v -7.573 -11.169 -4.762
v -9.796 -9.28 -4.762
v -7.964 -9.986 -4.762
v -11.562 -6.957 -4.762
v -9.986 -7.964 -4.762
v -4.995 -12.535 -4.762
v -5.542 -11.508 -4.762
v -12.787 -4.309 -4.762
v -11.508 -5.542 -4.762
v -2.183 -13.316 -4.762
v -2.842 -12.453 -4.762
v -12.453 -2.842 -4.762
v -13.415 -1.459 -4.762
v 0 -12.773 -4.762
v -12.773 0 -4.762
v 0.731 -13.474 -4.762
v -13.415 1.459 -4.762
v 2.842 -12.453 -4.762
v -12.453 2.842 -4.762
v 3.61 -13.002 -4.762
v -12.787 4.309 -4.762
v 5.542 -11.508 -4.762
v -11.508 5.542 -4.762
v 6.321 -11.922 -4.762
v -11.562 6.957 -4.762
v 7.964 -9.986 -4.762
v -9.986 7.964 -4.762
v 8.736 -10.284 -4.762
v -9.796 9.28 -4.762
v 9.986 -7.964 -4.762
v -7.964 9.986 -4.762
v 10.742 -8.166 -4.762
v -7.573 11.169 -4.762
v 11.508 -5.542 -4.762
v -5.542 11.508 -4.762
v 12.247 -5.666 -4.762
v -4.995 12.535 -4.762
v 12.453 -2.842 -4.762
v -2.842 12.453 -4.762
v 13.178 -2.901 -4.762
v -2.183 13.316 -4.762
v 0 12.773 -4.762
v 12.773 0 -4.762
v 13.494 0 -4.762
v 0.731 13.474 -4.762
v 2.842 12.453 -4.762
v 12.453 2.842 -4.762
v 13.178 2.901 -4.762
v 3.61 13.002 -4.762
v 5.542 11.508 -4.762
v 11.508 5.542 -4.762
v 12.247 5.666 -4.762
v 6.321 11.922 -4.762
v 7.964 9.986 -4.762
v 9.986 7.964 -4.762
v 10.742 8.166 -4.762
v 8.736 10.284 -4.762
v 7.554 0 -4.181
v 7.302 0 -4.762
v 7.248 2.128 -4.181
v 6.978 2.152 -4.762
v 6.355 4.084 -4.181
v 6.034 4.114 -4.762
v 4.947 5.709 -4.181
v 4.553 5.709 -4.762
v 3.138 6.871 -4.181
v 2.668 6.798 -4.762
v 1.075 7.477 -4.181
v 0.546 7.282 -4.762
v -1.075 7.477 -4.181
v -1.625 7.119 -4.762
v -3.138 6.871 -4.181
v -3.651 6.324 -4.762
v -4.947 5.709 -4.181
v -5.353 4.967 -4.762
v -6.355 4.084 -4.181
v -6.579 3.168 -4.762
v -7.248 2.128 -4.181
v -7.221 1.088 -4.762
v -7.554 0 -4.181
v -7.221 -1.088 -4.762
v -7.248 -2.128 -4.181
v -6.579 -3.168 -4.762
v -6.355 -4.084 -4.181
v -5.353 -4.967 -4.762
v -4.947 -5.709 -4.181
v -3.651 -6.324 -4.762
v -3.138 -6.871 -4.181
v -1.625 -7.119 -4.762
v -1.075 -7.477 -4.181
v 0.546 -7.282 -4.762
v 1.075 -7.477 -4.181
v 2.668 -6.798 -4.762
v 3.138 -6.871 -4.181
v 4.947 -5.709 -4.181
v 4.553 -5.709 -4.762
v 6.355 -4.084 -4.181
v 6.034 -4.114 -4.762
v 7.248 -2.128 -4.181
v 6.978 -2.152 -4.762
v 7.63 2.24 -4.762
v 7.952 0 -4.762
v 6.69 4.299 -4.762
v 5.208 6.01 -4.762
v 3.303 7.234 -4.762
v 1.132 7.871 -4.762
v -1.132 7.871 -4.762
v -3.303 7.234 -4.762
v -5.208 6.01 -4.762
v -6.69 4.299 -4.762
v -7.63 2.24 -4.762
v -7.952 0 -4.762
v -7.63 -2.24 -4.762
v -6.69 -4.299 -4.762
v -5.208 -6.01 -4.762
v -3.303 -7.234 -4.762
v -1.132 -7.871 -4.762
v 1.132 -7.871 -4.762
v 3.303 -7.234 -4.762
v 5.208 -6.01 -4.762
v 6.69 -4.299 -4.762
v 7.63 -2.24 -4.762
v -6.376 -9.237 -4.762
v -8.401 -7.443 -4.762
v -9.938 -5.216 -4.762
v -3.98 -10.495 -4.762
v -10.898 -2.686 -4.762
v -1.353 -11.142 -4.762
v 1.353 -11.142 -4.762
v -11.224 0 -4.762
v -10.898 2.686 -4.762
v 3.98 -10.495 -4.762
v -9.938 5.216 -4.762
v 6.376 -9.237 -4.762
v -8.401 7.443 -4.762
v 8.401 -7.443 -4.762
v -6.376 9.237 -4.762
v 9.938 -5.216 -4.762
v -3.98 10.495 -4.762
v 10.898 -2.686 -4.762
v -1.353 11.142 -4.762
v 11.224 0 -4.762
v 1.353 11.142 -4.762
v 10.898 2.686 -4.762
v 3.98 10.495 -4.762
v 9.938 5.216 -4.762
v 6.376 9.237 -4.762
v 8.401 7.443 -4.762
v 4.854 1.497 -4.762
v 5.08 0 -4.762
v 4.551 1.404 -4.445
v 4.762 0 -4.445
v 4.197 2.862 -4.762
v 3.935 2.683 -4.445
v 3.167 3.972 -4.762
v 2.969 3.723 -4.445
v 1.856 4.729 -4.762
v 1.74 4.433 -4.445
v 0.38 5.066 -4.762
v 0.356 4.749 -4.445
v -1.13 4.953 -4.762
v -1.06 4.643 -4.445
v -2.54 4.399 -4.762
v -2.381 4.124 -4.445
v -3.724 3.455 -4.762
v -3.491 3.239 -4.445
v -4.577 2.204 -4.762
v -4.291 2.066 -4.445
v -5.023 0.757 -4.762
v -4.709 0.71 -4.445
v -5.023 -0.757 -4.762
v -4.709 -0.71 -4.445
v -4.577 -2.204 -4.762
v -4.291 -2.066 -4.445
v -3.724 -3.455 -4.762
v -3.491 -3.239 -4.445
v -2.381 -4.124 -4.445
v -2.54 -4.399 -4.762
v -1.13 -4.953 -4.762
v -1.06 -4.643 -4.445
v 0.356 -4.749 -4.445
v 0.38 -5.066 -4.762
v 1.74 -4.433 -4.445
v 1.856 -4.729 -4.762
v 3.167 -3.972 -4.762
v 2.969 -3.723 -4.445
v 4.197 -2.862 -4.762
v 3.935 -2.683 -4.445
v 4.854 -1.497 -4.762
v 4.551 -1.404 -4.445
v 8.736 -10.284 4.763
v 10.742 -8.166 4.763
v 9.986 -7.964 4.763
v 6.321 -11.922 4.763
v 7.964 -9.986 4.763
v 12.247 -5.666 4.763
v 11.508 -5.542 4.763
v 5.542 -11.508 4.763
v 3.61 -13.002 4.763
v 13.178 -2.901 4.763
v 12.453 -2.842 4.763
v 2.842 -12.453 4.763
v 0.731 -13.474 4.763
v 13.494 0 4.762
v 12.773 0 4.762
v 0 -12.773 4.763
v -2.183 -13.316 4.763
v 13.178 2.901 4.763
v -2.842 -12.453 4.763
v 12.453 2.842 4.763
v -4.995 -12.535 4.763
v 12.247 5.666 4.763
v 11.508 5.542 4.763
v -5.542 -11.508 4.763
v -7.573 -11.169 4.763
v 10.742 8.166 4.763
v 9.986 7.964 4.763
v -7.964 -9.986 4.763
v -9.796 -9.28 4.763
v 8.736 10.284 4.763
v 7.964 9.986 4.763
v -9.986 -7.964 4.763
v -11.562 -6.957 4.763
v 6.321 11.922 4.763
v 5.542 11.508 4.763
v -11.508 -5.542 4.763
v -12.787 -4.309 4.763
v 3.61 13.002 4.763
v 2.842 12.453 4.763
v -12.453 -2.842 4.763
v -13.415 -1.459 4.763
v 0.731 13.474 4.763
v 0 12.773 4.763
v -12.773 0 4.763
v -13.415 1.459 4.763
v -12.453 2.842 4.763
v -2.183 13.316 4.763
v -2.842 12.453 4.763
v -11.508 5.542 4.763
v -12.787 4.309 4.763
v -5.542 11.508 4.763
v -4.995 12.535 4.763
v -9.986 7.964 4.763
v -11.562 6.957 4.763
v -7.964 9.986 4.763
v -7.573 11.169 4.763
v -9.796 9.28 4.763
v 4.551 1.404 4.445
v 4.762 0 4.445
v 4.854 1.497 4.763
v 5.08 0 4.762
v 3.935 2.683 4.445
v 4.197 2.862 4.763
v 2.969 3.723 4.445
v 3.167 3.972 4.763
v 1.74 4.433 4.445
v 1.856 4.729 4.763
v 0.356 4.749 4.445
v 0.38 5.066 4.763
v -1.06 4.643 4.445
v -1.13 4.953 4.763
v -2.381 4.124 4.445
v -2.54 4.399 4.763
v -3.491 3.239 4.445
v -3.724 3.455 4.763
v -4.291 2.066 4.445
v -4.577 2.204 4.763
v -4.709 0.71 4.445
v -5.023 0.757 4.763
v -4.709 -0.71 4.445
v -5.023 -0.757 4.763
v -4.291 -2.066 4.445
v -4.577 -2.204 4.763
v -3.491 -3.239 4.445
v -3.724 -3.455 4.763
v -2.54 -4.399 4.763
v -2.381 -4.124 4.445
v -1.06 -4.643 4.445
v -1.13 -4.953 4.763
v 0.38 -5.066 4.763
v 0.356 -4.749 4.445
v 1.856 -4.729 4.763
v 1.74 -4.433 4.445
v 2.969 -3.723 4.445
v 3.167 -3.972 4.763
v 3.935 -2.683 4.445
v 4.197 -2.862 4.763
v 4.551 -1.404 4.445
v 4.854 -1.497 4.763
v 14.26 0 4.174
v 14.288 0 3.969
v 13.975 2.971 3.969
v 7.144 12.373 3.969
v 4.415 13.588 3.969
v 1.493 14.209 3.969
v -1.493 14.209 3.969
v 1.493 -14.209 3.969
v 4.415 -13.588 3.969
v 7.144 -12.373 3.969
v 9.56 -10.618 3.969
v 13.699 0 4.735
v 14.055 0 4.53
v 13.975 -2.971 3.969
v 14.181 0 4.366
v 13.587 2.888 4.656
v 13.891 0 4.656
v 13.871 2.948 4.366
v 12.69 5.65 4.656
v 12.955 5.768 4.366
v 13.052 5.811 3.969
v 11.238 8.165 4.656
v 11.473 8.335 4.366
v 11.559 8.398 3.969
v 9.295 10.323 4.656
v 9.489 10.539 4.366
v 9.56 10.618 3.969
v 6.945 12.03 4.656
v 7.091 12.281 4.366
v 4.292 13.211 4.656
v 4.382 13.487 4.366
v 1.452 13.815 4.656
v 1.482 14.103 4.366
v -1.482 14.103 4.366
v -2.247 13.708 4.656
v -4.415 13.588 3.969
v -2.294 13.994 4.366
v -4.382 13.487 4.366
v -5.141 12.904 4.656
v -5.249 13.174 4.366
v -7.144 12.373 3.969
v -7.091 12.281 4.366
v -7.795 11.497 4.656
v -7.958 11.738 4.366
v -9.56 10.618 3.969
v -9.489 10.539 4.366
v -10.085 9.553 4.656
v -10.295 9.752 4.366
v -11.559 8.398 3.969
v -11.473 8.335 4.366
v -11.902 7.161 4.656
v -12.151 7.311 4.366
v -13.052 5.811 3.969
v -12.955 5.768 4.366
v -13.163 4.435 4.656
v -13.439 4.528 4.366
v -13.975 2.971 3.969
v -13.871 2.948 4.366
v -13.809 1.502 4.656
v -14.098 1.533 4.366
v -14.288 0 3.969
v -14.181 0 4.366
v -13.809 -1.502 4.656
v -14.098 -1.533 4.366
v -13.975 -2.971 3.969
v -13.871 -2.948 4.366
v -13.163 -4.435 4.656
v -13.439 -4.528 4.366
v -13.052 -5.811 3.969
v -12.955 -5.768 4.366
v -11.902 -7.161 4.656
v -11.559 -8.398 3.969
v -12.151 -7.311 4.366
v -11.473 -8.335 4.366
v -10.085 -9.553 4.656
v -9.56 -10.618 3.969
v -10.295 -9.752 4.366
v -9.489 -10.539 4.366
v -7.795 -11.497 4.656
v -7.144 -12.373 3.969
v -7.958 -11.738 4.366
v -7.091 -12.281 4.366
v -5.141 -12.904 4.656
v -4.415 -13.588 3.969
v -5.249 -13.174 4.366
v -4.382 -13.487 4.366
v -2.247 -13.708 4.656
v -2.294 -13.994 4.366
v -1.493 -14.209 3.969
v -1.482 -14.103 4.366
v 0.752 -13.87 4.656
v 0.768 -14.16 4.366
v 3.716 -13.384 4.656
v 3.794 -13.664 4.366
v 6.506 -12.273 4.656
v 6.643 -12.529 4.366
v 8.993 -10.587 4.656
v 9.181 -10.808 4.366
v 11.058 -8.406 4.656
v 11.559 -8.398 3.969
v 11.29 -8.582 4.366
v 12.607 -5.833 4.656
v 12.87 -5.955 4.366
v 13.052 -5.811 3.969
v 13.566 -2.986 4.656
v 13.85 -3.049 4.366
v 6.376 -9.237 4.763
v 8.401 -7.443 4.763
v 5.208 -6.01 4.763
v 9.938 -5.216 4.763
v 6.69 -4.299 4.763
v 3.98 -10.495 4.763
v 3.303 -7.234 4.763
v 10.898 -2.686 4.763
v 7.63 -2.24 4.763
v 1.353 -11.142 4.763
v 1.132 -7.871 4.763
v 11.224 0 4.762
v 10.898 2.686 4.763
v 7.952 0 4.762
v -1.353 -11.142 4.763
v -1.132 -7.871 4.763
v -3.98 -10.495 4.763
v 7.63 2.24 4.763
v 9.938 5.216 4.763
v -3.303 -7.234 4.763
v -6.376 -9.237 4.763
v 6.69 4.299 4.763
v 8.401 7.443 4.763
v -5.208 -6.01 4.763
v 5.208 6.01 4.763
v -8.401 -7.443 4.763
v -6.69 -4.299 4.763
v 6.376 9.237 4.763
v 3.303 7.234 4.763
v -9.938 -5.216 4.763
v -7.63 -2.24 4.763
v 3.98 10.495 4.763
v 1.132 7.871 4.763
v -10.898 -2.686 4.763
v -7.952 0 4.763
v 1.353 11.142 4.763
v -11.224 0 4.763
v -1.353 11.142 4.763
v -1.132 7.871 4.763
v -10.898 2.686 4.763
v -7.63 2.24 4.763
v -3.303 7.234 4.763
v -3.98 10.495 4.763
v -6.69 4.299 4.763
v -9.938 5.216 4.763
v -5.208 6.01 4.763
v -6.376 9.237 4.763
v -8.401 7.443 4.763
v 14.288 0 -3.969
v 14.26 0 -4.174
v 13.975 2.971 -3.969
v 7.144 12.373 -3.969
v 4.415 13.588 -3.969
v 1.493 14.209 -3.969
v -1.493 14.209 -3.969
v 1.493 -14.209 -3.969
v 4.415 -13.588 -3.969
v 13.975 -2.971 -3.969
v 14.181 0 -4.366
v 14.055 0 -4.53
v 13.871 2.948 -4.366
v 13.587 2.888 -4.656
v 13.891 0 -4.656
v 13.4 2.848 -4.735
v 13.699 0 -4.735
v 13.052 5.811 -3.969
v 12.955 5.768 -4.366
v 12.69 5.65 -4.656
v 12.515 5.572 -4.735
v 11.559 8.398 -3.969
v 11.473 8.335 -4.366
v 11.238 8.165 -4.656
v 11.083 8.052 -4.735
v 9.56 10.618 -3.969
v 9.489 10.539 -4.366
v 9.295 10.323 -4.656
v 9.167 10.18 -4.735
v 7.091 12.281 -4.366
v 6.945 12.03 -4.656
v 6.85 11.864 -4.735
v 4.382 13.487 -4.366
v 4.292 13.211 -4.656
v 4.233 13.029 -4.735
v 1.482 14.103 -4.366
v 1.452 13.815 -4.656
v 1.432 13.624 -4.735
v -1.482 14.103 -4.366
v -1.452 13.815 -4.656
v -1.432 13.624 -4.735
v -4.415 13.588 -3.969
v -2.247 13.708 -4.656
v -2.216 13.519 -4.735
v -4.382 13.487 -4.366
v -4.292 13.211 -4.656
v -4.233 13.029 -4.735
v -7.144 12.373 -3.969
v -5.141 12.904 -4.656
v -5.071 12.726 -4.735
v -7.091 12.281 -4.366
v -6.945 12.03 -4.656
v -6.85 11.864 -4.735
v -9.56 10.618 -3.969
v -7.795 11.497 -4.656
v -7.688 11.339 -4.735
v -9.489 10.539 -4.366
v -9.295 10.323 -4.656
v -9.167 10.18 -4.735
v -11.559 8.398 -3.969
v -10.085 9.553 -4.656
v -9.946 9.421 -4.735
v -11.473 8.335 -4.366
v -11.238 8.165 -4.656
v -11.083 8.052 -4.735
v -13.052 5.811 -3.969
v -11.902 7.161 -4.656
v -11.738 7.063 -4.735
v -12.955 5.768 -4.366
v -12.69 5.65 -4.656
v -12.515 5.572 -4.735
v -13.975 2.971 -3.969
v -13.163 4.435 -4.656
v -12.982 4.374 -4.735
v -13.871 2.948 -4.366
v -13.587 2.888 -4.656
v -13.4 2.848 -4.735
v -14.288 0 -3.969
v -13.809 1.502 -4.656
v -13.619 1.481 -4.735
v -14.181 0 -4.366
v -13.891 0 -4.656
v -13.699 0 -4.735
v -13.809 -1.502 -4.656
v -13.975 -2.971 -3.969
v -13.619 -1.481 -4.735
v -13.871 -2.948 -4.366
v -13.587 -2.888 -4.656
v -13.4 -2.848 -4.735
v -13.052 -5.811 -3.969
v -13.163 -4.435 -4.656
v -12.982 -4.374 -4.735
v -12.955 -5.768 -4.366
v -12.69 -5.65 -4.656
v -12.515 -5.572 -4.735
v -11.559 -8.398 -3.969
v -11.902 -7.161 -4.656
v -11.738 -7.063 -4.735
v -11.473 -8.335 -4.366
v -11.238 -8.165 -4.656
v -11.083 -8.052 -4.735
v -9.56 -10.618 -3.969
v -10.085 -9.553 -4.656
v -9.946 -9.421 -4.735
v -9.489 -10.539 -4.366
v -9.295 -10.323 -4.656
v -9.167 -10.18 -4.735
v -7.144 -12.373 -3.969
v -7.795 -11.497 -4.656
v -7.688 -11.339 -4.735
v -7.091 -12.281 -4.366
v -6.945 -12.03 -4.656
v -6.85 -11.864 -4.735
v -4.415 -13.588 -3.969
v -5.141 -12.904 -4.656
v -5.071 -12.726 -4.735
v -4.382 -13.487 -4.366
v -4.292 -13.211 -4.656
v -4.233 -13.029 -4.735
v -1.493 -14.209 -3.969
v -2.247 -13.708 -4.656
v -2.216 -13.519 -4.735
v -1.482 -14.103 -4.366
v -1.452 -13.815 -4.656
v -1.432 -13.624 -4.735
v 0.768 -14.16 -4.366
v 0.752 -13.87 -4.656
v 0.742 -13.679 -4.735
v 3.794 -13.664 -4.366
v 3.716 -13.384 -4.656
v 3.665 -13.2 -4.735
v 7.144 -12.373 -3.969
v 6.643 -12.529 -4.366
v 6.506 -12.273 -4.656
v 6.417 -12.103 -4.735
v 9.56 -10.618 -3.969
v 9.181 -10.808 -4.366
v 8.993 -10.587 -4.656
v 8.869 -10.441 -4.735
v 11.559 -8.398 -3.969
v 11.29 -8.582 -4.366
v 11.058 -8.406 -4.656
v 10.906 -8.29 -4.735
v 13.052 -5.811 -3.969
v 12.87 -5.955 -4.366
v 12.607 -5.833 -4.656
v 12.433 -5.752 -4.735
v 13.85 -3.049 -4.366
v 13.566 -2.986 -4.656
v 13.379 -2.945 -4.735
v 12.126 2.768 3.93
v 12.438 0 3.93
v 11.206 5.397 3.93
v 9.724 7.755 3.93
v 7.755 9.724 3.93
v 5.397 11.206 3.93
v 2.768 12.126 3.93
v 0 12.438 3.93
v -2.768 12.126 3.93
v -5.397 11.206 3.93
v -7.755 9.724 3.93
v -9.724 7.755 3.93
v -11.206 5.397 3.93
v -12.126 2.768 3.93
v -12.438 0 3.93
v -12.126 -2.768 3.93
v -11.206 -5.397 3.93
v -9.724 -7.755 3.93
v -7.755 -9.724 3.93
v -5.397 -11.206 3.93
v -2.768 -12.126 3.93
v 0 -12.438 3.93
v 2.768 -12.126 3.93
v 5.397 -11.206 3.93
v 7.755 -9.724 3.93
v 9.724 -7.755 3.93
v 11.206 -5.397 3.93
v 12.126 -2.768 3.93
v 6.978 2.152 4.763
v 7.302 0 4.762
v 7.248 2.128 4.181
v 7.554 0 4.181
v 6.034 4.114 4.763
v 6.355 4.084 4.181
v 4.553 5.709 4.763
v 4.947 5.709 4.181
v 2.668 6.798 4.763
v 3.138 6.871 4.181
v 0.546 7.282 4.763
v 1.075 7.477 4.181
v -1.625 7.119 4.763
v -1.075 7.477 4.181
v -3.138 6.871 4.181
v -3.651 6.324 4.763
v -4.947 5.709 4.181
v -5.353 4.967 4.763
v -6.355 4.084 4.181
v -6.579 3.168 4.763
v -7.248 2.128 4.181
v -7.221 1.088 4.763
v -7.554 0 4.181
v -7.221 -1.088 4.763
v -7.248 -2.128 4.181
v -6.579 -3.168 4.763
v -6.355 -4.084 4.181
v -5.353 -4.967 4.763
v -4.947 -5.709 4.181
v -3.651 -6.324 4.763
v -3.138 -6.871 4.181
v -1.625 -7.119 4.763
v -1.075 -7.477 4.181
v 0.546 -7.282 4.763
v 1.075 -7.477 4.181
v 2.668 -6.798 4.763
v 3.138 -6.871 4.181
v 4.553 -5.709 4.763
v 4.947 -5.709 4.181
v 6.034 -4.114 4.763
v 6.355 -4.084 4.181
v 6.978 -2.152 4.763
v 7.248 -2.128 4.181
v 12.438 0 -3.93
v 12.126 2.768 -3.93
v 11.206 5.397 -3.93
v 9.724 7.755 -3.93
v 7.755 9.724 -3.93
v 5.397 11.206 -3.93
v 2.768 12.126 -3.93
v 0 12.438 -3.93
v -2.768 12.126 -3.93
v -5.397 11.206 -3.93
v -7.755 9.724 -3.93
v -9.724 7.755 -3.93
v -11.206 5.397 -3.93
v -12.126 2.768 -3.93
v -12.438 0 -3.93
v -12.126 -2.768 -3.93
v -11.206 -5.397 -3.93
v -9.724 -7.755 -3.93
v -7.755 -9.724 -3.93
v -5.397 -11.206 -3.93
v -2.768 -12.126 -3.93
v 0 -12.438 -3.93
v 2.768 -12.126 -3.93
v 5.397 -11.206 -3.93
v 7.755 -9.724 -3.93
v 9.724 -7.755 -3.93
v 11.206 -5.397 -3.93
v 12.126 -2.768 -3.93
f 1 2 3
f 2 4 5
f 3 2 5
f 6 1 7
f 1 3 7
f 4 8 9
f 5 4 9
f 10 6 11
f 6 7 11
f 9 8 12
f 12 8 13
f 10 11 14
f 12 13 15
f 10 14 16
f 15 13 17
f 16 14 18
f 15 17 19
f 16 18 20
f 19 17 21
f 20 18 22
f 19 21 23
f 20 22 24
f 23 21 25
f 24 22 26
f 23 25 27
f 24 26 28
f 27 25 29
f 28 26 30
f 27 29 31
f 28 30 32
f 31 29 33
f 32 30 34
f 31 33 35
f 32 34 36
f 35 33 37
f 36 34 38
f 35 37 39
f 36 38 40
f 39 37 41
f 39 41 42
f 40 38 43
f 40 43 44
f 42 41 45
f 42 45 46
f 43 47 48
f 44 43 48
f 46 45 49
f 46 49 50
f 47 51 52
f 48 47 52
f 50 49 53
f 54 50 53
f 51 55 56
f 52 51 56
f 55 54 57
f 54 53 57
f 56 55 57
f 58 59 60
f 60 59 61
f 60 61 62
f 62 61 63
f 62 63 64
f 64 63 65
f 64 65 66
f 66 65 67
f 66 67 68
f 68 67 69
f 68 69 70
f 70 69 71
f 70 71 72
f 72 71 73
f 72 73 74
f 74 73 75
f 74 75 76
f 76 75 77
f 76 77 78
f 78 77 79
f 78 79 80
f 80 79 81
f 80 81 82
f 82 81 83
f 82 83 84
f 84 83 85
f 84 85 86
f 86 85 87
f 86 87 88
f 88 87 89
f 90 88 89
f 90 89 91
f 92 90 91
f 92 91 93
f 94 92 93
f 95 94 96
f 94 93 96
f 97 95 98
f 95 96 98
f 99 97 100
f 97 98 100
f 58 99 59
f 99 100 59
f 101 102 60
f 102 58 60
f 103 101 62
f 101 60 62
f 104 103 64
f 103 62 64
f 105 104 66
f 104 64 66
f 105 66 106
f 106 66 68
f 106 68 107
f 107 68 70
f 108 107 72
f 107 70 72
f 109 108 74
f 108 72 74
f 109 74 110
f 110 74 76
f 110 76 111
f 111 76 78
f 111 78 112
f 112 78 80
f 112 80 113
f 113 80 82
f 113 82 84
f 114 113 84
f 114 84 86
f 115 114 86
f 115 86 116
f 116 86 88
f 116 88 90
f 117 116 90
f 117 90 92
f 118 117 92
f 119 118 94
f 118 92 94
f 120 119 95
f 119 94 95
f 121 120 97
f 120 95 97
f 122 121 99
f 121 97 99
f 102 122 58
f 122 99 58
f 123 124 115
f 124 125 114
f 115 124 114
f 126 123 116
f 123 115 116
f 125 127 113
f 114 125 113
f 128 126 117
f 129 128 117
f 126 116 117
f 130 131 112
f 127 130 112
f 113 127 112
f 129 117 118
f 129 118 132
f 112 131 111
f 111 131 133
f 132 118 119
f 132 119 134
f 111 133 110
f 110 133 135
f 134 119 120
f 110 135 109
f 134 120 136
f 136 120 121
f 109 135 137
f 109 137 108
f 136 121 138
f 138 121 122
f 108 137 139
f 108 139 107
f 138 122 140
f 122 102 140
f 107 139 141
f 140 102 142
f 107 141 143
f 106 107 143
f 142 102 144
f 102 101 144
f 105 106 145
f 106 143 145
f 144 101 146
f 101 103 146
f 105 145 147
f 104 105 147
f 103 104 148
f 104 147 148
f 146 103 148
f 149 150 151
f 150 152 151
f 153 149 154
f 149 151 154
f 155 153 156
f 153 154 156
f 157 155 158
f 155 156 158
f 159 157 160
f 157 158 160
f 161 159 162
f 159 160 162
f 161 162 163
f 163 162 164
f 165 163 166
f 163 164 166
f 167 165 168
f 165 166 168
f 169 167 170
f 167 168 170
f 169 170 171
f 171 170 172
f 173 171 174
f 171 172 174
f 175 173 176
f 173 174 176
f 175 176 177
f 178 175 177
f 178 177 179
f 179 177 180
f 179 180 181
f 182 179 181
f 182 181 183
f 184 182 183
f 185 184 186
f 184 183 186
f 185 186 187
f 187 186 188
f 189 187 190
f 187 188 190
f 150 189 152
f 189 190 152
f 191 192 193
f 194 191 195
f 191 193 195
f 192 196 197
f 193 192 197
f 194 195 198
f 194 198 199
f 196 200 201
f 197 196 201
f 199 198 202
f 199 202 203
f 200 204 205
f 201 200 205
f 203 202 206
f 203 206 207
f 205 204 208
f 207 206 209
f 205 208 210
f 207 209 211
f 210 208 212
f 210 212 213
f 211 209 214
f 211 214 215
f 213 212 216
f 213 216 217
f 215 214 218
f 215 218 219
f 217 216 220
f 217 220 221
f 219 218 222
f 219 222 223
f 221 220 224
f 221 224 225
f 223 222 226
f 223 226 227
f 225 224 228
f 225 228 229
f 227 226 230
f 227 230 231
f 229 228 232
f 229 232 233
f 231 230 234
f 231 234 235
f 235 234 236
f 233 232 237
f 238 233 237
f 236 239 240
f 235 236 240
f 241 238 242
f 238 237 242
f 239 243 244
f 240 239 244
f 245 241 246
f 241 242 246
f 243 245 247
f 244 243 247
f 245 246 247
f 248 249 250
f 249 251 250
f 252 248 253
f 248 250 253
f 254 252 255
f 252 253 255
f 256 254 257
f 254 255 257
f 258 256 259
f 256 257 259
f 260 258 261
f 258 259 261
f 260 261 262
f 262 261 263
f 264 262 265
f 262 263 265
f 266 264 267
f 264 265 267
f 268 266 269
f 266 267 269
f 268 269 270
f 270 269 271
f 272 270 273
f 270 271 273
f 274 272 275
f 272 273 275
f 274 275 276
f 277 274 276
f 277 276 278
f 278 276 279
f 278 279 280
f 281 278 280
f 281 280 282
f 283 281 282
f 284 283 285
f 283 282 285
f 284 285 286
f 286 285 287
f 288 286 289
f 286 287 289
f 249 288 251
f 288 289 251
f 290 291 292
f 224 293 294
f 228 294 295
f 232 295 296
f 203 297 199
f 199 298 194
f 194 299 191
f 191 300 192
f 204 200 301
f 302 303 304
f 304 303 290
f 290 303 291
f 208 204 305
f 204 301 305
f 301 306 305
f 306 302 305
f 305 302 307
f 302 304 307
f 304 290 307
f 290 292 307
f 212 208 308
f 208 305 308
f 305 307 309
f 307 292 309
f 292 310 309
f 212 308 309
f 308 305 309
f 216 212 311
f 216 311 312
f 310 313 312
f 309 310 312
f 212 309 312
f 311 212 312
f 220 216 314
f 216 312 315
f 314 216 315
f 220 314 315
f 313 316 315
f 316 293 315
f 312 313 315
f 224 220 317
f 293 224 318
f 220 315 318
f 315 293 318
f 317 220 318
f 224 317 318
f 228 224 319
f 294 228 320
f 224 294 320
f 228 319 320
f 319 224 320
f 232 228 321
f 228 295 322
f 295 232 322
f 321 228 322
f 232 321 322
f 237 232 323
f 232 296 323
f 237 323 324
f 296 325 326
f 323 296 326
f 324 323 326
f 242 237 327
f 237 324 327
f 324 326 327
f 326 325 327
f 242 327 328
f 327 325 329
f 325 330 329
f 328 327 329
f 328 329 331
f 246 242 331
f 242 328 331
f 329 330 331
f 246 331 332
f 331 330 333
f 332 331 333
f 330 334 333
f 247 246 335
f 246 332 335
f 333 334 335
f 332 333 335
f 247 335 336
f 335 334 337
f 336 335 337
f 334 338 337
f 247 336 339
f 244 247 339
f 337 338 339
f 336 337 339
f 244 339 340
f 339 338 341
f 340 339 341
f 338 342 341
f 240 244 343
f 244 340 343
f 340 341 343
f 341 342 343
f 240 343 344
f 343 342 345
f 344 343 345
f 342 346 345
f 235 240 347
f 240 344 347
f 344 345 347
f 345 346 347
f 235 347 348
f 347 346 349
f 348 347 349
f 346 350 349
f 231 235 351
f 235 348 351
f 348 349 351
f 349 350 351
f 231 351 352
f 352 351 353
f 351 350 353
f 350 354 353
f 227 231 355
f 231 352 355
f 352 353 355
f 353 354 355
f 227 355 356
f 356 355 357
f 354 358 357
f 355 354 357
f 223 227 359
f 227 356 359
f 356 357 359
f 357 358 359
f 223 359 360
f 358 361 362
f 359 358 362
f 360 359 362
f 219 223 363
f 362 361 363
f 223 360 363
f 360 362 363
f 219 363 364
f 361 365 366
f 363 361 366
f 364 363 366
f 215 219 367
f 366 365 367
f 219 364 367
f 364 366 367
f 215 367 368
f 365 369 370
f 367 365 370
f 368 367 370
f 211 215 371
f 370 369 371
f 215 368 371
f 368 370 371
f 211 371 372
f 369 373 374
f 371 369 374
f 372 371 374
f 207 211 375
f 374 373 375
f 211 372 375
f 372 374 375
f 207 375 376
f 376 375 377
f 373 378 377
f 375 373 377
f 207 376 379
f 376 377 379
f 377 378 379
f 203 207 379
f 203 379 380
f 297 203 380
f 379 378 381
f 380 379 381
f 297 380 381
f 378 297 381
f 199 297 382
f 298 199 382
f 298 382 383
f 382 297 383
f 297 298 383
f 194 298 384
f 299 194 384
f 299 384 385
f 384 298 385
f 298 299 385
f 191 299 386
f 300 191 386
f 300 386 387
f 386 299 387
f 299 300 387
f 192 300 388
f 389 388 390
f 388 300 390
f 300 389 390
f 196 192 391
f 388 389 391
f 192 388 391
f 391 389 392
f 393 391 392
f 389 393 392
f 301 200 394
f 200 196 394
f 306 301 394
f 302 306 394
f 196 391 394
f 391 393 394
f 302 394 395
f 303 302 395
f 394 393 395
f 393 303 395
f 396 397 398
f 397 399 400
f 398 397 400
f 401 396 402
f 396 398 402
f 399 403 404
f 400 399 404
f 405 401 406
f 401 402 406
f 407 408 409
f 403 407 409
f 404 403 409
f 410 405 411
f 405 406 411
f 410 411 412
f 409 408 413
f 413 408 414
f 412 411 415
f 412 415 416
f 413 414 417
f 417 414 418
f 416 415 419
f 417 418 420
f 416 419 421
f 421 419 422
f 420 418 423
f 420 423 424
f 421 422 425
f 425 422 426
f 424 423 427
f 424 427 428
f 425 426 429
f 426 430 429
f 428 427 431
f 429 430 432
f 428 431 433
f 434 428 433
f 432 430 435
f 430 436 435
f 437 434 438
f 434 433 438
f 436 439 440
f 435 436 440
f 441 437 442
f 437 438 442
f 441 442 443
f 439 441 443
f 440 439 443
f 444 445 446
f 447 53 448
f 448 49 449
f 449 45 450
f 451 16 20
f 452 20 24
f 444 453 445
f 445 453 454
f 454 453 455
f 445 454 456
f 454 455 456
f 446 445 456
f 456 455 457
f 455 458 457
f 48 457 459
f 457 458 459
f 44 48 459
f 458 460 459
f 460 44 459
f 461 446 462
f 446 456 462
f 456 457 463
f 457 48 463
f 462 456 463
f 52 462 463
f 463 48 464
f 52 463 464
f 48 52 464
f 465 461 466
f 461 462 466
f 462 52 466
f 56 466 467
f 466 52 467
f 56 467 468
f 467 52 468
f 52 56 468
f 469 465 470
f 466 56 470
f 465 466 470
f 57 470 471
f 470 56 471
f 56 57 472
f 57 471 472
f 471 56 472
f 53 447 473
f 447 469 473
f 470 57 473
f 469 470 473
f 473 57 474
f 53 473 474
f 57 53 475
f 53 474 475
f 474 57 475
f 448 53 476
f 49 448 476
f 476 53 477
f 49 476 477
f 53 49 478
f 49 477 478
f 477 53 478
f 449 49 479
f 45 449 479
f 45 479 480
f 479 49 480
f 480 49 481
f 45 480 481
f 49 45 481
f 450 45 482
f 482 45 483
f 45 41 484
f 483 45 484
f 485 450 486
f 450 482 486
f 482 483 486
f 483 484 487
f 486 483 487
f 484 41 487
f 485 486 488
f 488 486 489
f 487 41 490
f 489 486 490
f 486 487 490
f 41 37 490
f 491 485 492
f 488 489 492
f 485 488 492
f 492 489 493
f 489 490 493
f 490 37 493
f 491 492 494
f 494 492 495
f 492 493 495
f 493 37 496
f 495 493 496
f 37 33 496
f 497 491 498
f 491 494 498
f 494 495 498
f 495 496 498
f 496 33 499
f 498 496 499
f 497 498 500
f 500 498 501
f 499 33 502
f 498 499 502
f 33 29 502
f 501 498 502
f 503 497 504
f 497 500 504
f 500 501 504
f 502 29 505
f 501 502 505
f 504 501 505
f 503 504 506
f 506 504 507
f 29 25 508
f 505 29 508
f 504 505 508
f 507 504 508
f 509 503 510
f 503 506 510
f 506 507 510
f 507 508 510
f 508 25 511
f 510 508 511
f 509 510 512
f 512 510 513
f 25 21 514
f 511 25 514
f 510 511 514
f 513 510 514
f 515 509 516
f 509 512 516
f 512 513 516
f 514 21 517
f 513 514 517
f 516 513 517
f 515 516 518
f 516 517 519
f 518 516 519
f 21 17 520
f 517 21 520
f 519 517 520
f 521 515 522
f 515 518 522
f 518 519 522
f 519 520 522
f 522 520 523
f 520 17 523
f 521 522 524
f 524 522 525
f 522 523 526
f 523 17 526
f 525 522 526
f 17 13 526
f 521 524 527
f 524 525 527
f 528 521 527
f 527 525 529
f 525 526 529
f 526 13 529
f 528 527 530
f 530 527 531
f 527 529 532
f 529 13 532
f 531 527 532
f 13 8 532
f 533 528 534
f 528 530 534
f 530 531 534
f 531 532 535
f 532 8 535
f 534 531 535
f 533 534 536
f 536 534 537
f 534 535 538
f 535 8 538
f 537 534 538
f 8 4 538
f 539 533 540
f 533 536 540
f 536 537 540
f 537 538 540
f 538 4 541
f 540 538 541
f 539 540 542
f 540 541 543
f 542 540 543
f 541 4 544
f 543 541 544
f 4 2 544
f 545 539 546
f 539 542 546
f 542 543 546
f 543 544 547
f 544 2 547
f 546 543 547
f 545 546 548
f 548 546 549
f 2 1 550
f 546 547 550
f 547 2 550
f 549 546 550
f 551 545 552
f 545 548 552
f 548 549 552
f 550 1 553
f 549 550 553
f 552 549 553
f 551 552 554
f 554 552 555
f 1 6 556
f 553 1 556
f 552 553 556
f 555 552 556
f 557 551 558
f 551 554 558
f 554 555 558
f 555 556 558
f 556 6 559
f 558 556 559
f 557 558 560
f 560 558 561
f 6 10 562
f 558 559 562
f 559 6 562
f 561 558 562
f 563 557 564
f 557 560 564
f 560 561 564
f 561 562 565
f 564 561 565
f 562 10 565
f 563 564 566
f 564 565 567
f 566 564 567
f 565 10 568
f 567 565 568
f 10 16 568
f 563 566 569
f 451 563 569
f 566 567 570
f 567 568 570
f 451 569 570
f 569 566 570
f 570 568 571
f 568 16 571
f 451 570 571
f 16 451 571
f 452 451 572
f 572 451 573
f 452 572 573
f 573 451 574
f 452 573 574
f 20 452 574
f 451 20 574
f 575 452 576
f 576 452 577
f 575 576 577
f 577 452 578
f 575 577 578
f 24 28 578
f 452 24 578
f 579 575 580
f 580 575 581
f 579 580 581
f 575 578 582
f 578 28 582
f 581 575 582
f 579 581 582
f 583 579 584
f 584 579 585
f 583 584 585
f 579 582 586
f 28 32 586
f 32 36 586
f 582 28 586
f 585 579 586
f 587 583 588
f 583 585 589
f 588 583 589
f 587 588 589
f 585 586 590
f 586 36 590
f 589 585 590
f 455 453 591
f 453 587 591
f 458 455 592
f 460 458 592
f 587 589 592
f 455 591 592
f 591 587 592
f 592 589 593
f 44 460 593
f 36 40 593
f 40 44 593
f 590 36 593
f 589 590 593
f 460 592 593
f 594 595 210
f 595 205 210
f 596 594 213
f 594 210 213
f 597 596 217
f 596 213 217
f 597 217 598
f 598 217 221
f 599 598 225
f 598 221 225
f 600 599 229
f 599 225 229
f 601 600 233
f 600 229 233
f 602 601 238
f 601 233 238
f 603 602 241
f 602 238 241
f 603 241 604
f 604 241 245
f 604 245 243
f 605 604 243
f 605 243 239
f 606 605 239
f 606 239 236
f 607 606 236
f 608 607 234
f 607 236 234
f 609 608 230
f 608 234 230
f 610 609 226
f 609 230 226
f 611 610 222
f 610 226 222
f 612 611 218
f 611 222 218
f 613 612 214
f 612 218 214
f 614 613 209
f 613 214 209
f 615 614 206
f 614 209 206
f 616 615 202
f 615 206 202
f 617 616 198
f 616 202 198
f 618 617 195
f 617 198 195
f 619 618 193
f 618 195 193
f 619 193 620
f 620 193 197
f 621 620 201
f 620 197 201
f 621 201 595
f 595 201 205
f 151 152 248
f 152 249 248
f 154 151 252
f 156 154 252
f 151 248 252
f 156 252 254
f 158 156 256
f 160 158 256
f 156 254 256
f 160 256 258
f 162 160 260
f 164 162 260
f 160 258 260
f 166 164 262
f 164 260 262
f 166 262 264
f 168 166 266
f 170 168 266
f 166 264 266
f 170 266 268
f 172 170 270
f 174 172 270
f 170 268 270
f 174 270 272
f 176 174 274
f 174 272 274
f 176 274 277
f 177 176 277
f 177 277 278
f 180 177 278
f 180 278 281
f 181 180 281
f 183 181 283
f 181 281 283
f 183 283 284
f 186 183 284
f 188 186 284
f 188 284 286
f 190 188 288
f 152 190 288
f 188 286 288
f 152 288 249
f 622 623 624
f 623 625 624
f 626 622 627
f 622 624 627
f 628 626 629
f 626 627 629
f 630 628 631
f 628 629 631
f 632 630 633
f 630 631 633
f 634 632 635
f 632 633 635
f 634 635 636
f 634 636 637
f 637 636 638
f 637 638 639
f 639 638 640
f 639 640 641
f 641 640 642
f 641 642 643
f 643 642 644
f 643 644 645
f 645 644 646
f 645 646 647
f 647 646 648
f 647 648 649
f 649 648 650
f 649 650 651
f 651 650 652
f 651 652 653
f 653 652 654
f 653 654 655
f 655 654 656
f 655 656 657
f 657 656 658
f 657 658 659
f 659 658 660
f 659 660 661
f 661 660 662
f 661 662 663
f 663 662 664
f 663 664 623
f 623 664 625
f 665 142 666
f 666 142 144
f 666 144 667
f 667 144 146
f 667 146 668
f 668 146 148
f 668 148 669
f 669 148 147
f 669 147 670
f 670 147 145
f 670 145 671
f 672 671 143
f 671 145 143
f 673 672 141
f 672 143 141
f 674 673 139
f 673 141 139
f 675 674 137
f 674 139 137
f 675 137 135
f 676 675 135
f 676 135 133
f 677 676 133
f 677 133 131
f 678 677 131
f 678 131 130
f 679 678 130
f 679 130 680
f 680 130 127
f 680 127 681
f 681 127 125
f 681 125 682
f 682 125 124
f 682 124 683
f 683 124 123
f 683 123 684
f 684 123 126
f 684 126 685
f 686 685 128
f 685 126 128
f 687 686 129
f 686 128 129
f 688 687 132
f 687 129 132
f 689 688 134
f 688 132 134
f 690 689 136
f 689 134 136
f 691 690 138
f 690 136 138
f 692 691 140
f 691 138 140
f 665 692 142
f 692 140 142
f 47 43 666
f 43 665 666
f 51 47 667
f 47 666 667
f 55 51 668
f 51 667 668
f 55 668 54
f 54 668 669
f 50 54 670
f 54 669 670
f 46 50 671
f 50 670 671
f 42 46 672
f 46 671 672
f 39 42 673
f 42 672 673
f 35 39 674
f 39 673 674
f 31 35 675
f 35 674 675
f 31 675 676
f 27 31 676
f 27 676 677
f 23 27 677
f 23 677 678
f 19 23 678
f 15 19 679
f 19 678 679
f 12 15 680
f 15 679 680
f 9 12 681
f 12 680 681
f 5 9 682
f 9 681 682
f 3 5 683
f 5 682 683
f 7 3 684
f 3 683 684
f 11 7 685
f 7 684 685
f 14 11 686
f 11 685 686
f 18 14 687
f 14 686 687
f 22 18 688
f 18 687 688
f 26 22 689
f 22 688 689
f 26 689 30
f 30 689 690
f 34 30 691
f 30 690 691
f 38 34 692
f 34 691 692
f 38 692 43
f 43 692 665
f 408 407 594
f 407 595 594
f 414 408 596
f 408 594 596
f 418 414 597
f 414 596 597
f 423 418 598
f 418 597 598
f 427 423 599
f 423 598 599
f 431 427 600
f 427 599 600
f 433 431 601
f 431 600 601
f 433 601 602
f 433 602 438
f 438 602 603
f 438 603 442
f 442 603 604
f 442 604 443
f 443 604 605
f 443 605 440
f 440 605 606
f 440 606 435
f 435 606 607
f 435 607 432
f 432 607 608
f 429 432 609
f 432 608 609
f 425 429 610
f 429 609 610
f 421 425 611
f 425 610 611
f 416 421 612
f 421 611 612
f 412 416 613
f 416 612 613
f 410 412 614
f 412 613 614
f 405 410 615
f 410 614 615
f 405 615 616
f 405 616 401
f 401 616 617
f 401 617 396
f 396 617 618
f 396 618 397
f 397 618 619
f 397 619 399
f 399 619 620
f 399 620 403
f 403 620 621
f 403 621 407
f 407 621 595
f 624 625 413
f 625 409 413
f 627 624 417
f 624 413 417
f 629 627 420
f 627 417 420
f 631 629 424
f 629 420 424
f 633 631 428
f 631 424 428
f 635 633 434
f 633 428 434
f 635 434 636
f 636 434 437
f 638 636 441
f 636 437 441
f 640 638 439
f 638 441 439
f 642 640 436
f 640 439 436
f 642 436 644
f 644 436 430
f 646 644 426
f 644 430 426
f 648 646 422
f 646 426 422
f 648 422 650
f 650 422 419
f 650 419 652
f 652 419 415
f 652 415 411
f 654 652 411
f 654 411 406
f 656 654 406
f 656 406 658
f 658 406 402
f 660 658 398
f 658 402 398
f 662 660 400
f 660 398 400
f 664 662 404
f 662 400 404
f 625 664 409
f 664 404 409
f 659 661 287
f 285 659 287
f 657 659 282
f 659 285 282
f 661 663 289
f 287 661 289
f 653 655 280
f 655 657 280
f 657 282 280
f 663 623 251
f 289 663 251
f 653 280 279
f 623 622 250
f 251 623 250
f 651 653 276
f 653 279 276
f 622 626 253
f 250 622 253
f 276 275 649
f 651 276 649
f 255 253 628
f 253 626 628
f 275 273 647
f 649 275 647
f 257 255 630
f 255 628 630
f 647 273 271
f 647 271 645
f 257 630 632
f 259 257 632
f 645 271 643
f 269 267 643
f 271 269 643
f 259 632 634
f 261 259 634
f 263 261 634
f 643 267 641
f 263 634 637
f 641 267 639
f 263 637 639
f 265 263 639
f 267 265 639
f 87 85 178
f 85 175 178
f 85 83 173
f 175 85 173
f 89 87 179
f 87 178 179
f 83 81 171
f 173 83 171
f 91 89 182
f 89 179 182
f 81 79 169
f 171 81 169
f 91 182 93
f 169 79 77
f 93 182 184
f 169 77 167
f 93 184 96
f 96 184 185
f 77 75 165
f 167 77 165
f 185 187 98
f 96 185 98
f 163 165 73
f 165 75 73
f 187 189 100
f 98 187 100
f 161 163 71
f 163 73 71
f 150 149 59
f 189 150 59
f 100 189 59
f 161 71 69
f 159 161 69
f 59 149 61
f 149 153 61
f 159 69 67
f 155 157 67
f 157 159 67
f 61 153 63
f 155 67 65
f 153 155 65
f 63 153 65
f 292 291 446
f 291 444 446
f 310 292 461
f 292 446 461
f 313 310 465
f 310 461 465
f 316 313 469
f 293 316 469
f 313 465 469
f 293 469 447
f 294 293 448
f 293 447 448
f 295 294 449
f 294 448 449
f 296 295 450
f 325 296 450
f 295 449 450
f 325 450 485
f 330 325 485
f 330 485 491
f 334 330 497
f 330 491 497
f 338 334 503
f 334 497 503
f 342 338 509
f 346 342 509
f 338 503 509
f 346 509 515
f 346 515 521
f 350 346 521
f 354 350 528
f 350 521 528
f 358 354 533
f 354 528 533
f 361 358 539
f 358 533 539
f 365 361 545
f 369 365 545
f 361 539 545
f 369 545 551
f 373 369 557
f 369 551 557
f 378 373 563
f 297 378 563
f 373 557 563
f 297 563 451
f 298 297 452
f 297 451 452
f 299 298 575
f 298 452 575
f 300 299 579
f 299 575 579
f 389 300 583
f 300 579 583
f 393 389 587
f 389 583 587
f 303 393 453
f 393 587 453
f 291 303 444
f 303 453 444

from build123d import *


with BuildPart() as part:
    # Esquisse1 → Révolution1 (revolve)
    with BuildSketch(Plane(origin=(0, 0, 0), x_dir=(1, 0, 0), z_dir=(0, 1, 0))):
        with BuildLine():
            Line((5.08, 4.7625), (4.7625, 4.445))
            Line((4.7625, 4.445), (4.7625, -4.445))
            Line((4.7625, -4.445), (5.08, -4.7625))
            Line((5.08, -4.7625), (7.3025, -4.7625))
            Line((7.3025, -4.7625), (7.553657425, -4.181328901))
            Line((7.553657425, -4.181328901), (7.952136973, -4.7625))
            Line((7.952136973, -4.7625), (11.224132695, -4.7625))
            Line((11.224132695, -4.7625), (12.438060247, -3.930171442))
            Line((12.438060247, -3.930171442), (12.772936813, -4.7625))
            Line((12.772936813, -4.7625), (13.49375, -4.7625))
            ThreePointArc((13.49375, -4.7625), (14.055016008, -4.530016008), (14.2875, -3.96875))
            Line((14.2875, -3.96875), (14.2875, 3.96875))
            ThreePointArc((14.2875, 3.96875), (14.055016008, 4.530016007), (13.49375, 4.7625))
            Line((13.49375, 4.7625), (12.772936813, 4.7625))
            Line((12.772936813, 4.7625), (12.438060247, 3.930171442))
            Line((12.438060247, 3.930171442), (11.224132694, 4.7625))
            Line((11.224132694, 4.7625), (7.952136973, 4.7625))
            Line((7.952136973, 4.7625), (7.553657425, 4.1813289))
            Line((7.553657425, 4.1813289), (7.3025, 4.7625))
            Line((7.3025, 4.7625), (5.08, 4.7625))
        make_face()
    revolve(axis=Axis((0, 0, -4.76375), (0, 0, 1)))


solid = part.part
